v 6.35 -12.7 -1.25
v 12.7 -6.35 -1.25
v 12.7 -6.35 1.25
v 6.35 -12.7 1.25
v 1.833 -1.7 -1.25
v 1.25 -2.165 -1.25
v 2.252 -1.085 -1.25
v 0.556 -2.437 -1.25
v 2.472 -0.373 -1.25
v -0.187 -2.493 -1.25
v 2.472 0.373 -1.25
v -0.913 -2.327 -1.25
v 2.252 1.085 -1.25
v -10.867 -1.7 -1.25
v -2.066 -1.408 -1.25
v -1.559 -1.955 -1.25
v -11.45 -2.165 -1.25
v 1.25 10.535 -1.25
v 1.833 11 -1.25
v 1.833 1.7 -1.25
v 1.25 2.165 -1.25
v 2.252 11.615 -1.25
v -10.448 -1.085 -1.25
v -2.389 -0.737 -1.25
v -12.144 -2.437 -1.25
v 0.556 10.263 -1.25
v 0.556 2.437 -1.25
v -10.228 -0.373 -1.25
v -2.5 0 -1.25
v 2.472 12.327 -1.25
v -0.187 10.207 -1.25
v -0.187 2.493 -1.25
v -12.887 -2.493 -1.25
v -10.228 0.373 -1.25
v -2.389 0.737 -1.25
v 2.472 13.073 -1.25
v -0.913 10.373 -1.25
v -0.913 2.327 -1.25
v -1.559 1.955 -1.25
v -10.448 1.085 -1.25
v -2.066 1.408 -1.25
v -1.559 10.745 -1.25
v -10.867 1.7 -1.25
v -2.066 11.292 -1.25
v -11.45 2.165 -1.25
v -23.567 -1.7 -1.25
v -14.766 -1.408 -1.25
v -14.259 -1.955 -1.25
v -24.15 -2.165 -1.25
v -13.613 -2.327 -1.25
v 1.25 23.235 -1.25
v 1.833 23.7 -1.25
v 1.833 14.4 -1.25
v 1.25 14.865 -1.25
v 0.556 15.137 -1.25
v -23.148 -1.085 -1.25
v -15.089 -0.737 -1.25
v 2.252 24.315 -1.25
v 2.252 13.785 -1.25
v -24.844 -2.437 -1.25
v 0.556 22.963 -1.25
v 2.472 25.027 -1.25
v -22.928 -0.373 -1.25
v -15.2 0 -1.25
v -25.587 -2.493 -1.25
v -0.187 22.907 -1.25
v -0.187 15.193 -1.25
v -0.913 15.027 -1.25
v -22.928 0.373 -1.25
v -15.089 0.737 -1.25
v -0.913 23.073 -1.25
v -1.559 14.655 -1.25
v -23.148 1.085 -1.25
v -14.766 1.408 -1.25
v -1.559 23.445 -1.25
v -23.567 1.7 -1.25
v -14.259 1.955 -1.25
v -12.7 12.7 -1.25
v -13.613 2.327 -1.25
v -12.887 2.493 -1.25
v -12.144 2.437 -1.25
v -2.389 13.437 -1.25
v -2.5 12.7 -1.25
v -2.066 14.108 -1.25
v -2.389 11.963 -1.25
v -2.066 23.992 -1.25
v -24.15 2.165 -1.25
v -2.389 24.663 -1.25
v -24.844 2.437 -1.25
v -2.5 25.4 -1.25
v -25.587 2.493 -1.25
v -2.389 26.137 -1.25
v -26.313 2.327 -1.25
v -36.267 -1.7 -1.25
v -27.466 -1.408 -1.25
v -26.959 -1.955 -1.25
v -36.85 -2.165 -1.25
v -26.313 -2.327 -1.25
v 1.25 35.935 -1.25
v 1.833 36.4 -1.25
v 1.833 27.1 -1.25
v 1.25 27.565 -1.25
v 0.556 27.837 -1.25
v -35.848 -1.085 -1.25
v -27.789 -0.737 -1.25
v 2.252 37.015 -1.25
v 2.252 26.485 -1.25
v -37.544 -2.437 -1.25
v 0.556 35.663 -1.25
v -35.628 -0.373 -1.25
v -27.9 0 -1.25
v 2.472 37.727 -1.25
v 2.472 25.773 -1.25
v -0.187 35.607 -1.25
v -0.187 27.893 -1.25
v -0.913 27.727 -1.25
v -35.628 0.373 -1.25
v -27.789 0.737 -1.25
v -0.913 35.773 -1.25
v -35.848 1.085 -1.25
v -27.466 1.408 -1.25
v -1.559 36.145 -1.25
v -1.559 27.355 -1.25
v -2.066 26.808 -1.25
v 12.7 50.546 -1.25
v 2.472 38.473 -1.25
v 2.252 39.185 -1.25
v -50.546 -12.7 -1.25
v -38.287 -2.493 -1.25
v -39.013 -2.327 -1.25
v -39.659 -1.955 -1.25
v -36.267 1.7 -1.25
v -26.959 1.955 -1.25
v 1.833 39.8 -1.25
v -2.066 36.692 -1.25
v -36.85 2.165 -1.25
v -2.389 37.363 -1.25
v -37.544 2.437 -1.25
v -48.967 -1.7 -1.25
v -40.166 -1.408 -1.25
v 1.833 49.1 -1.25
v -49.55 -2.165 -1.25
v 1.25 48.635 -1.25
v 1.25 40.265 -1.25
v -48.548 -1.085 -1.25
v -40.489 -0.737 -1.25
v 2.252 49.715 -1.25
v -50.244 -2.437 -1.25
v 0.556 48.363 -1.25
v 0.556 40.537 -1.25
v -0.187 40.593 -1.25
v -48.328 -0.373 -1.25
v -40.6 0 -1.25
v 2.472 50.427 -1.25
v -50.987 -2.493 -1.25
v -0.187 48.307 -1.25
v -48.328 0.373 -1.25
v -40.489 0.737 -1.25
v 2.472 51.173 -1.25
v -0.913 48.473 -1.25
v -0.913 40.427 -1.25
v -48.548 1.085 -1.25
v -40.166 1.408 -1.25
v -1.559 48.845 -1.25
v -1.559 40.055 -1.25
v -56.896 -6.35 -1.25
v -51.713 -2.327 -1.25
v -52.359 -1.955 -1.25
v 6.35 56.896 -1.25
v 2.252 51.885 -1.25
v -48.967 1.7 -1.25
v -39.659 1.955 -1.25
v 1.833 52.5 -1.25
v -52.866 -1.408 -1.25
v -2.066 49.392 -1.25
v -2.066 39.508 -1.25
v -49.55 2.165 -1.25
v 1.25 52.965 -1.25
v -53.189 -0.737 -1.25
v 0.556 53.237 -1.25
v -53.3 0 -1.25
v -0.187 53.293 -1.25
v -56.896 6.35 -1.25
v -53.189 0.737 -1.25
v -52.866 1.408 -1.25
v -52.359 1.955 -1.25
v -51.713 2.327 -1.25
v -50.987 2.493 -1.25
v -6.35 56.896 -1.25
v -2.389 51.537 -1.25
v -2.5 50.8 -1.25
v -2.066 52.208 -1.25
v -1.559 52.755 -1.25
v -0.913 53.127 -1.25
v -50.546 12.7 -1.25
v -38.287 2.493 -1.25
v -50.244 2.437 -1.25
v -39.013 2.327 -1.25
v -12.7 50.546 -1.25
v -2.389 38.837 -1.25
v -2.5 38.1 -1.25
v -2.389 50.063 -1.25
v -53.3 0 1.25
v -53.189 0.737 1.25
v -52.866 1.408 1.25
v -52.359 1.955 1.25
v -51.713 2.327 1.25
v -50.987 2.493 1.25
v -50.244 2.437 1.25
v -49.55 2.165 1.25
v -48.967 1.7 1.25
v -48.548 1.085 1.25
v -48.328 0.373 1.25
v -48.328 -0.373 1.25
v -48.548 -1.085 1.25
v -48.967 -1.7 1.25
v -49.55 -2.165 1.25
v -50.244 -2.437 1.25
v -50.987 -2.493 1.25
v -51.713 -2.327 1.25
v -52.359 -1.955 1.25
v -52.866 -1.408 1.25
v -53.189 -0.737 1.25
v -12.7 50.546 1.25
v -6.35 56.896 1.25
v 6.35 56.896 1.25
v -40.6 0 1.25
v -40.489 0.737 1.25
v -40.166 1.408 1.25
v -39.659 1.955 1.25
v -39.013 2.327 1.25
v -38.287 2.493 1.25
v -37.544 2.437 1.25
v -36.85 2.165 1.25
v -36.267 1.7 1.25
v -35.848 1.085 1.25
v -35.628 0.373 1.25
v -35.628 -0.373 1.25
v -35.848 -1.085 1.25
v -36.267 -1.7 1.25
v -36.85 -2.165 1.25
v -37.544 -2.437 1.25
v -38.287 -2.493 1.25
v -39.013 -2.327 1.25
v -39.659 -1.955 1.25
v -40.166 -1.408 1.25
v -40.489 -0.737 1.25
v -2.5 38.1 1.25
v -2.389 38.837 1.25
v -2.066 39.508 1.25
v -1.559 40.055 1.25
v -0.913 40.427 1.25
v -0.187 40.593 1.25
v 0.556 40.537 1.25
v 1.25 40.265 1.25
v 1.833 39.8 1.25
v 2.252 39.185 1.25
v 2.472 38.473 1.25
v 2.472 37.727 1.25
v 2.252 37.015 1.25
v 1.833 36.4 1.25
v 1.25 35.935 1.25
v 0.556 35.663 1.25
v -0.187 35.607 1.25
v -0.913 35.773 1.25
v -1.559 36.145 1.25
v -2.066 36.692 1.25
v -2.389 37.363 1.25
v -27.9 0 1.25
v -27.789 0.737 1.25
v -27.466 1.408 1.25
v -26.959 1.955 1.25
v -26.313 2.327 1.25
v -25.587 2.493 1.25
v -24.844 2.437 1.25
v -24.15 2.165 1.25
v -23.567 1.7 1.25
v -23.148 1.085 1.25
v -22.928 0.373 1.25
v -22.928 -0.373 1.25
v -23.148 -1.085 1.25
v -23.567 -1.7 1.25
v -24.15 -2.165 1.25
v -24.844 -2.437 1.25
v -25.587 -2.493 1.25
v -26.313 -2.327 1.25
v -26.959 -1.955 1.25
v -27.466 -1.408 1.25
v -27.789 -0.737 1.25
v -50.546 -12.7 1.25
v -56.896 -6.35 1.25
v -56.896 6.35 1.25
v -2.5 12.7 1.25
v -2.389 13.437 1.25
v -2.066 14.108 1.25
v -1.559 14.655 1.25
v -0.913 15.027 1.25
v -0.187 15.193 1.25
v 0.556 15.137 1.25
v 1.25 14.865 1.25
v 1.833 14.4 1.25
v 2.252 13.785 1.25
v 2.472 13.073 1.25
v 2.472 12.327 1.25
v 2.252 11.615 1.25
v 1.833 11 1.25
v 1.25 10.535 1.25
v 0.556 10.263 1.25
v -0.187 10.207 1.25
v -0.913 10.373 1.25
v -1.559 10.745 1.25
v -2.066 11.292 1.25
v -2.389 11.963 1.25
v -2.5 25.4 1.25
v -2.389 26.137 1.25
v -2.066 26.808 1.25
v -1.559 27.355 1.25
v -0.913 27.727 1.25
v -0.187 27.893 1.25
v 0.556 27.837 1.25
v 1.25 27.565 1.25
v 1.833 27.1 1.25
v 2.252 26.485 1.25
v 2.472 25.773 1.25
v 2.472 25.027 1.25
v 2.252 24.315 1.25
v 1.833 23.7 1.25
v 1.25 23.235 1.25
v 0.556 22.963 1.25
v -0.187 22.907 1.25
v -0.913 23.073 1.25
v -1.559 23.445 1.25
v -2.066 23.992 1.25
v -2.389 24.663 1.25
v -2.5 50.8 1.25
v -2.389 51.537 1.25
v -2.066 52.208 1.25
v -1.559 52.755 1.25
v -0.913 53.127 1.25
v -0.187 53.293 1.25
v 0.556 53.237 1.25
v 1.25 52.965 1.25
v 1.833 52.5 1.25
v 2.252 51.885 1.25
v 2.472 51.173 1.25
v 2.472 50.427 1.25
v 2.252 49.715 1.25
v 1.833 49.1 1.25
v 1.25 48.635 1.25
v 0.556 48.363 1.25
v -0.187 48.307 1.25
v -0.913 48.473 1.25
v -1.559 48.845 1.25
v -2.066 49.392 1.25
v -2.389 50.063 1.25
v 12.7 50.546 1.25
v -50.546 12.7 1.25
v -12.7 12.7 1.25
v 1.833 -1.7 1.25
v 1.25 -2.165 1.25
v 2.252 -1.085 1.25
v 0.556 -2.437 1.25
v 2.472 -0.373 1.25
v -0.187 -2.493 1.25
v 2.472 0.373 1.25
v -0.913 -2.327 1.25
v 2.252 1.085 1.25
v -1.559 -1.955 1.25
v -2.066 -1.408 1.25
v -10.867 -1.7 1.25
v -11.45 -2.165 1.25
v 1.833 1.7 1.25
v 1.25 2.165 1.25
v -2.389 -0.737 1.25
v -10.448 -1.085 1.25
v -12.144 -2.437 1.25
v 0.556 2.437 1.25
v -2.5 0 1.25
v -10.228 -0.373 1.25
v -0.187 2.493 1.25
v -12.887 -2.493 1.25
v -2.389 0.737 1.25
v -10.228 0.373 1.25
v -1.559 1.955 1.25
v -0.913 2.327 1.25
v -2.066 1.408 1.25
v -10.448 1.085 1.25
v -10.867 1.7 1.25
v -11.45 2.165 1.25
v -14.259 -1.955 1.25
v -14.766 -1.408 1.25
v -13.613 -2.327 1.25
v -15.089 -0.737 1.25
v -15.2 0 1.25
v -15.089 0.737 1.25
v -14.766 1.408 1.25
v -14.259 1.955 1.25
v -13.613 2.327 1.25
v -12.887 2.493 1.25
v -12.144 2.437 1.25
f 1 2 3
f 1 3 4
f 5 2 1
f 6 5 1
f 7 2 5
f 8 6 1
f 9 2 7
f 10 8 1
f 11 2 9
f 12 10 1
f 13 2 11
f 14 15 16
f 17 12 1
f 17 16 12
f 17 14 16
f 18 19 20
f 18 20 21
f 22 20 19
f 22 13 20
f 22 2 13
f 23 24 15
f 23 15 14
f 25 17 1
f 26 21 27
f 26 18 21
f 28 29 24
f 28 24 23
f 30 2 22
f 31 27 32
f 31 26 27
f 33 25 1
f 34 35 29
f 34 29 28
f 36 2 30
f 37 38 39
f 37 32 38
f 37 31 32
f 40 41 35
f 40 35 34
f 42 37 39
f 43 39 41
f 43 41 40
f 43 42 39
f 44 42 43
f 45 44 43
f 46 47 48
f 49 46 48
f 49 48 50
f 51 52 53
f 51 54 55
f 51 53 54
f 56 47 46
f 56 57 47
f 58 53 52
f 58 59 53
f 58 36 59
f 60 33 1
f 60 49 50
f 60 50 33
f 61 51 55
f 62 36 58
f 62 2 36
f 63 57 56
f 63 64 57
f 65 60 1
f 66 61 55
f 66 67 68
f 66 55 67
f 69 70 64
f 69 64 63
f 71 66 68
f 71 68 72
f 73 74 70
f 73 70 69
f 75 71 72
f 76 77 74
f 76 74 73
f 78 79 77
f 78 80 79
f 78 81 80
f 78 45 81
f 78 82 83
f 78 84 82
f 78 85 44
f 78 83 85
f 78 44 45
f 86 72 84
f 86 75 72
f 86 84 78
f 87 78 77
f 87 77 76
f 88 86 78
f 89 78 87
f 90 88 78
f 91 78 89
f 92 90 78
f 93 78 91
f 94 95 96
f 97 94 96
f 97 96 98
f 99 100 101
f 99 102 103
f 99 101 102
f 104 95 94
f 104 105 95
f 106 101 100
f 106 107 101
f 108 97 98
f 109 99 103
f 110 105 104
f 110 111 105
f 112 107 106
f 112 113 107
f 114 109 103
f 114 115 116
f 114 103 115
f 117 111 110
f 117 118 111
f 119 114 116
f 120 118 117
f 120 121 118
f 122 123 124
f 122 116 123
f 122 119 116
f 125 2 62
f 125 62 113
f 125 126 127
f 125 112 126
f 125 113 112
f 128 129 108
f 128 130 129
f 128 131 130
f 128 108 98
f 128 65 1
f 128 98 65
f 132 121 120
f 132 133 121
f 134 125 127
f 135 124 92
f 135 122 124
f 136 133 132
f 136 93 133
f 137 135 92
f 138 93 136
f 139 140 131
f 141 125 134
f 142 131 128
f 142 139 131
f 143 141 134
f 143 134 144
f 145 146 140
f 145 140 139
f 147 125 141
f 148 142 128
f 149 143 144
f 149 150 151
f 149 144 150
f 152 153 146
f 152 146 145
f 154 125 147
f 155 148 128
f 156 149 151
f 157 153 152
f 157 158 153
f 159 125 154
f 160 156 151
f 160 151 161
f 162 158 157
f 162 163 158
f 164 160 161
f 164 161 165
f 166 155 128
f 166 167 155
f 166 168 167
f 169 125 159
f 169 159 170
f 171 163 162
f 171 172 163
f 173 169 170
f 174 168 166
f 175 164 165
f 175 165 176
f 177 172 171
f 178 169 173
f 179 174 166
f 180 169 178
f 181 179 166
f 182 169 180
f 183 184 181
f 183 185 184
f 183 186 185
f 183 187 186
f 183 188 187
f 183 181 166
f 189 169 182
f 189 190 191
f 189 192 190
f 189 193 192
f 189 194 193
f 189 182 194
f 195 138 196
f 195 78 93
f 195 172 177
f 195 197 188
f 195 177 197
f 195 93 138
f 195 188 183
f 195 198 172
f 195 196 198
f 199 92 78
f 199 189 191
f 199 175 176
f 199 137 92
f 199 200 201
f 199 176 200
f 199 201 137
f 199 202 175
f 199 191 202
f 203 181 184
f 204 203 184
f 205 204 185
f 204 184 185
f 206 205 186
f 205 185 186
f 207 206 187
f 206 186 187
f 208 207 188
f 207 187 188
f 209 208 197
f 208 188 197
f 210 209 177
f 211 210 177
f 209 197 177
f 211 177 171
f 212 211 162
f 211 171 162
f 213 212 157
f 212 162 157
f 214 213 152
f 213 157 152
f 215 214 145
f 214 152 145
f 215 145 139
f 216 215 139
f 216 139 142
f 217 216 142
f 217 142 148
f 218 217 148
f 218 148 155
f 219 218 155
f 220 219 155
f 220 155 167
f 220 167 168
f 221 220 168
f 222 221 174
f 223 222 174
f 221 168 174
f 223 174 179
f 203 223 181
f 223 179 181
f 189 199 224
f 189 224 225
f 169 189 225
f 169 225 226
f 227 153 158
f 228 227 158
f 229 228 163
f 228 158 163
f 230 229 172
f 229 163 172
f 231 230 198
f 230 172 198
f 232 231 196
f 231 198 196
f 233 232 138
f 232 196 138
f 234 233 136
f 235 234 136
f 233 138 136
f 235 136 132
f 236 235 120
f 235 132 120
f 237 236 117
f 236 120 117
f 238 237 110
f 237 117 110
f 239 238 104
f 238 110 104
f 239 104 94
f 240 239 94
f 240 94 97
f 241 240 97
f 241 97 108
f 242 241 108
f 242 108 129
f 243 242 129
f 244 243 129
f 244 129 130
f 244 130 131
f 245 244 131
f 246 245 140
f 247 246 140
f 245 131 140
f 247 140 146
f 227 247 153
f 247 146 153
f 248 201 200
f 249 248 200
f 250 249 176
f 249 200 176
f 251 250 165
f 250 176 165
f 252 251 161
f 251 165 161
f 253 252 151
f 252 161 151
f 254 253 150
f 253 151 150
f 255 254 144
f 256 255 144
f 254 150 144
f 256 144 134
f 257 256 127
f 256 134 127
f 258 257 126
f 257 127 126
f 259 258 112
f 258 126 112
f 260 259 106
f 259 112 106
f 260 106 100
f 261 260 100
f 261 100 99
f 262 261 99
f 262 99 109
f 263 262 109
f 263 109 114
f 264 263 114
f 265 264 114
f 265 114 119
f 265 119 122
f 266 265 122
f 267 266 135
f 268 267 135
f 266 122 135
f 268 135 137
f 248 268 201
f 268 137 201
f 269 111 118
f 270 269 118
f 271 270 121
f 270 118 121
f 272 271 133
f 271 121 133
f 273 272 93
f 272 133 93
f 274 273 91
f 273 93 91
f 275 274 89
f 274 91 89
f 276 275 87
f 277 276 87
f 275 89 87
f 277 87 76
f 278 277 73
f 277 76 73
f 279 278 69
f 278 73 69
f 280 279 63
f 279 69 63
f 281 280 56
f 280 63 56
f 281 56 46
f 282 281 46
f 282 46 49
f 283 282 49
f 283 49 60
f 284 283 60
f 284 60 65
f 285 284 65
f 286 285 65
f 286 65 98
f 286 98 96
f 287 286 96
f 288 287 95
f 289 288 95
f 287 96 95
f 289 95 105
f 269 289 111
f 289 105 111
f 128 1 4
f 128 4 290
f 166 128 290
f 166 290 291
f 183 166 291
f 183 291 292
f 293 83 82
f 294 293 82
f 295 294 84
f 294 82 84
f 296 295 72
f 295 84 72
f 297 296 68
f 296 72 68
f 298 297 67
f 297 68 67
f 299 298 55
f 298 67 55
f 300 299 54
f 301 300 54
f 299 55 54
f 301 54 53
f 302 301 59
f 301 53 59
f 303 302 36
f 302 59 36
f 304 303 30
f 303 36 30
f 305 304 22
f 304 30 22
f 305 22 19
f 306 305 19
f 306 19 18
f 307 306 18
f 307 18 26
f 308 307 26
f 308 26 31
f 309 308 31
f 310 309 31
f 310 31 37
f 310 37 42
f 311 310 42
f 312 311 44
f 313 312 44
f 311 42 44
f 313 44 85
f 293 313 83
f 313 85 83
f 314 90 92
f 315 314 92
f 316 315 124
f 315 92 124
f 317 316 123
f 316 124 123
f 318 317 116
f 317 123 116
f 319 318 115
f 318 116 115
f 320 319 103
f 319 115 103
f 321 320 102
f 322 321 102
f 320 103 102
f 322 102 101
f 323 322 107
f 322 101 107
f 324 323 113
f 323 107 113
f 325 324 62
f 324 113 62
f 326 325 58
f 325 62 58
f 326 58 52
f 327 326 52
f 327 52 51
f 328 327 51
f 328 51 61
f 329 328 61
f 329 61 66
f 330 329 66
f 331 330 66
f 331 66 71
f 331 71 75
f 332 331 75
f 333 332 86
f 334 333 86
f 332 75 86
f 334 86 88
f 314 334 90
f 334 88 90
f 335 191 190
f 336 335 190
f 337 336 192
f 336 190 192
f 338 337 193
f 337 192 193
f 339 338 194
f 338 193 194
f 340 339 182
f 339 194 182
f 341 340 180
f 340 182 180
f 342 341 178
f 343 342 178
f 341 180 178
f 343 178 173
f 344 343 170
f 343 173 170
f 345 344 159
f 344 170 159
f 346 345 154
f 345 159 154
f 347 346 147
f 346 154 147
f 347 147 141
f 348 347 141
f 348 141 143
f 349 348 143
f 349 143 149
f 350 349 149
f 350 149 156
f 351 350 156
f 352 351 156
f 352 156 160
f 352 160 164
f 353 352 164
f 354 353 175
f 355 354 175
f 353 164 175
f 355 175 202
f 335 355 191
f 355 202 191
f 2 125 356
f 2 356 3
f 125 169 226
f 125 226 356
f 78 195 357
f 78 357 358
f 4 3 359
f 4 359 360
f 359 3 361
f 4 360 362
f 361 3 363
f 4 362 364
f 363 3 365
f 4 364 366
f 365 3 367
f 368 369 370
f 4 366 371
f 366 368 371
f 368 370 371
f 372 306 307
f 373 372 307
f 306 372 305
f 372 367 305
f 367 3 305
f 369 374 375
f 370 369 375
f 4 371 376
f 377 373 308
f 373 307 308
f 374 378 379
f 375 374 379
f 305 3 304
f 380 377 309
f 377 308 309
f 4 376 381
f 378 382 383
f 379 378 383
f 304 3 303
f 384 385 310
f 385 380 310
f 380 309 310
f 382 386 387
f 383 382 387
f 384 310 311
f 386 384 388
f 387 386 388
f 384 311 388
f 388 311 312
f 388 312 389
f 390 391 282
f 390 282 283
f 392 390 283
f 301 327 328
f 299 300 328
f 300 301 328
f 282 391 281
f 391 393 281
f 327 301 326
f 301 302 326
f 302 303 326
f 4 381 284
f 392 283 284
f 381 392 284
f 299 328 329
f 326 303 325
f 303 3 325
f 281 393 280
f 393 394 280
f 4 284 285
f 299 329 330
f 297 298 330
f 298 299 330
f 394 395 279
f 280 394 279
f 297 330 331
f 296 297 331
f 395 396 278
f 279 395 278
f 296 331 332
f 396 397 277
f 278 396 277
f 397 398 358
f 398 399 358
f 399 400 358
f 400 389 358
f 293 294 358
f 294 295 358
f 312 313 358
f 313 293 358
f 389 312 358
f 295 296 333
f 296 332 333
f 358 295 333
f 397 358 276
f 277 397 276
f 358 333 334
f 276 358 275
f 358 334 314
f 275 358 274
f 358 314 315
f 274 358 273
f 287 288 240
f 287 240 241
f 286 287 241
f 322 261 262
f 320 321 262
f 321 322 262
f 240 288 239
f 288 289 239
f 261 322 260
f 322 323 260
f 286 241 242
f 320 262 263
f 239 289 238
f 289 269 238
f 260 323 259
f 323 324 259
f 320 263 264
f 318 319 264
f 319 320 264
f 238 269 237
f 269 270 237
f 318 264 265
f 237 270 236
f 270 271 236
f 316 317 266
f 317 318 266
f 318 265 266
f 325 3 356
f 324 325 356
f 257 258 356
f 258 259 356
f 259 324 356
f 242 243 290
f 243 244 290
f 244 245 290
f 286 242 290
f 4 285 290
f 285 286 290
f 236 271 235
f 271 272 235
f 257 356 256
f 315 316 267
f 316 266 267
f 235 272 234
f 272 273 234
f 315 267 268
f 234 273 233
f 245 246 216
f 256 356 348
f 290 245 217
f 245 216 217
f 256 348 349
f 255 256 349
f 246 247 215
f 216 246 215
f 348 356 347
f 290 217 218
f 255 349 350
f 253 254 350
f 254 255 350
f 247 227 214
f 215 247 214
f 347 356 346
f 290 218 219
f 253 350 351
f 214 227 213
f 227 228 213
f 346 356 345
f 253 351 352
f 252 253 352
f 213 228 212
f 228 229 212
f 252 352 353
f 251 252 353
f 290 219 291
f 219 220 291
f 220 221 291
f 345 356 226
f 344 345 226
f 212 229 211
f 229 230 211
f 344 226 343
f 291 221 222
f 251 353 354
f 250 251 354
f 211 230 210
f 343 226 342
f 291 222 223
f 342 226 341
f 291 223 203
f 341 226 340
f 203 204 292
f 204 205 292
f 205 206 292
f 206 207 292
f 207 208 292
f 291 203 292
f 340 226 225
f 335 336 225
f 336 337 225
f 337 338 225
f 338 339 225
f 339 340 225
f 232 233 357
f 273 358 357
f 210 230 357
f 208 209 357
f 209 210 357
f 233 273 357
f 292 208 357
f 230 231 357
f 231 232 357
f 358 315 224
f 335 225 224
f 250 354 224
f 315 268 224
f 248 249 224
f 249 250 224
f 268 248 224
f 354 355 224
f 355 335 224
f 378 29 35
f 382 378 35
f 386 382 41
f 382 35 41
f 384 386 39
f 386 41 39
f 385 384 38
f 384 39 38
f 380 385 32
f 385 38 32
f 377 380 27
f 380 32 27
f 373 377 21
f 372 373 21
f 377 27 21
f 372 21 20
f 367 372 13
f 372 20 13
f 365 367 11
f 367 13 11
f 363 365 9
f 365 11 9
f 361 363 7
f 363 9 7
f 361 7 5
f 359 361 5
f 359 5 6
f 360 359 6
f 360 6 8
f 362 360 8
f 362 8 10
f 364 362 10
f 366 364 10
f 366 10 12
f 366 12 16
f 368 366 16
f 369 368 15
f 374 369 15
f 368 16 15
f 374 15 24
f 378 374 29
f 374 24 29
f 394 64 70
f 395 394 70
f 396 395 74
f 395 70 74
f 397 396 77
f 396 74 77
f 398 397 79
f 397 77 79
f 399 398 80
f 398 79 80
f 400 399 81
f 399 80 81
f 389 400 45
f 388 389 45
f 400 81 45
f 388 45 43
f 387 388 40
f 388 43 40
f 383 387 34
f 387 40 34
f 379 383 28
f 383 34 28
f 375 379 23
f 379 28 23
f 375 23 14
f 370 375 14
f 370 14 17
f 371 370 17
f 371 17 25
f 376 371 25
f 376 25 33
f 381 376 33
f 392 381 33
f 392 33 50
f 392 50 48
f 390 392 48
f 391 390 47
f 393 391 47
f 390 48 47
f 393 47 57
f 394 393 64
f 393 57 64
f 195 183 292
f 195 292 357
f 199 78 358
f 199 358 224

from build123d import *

# Parameters (mm, degrees)
SKETCH1_R           = 2.5
BOSS_EXTRUDE1_DEPTH = 2.5


with BuildPart() as part:
    # Sketch1 → Boss-Extrude1 (new body)
    with BuildSketch(Plane(origin=(0, 0, -1.25), x_dir=(-1, 0, 0), z_dir=(0, 0, -1))):
        Polygon((-6.35, -12.7), (50.546, -12.7), (56.896, -6.35), (56.896, 6.35), (50.546, 12.7), (12.7, 12.7), (12.7, 50.546), (6.35, 56.896), (-6.35, 56.896), (-12.7, 50.546), (-12.7, -6.35), align=None)
        with Locations((0, 12.7)):
            Circle(SKETCH1_R, mode=Mode.SUBTRACT)
        with Locations((0, 25.4)):
            Circle(SKETCH1_R, mode=Mode.SUBTRACT)
        with Locations((12.7, 0)):
            Circle(SKETCH1_R, mode=Mode.SUBTRACT)
        with Locations((25.4, 0)):
            Circle(SKETCH1_R, mode=Mode.SUBTRACT)
        Circle(SKETCH1_R, mode=Mode.SUBTRACT)
        with Locations((50.8, 0)):
            Circle(SKETCH1_R, mode=Mode.SUBTRACT)
        with Locations((38.1, 0)):
            Circle(SKETCH1_R, mode=Mode.SUBTRACT)
        with Locations((0, 50.8)):
            Circle(SKETCH1_R, mode=Mode.SUBTRACT)
        with Locations((0, 38.1)):
            Circle(SKETCH1_R, mode=Mode.SUBTRACT)
    extrude(amount=-BOSS_EXTRUDE1_DEPTH)


solid = part.part
